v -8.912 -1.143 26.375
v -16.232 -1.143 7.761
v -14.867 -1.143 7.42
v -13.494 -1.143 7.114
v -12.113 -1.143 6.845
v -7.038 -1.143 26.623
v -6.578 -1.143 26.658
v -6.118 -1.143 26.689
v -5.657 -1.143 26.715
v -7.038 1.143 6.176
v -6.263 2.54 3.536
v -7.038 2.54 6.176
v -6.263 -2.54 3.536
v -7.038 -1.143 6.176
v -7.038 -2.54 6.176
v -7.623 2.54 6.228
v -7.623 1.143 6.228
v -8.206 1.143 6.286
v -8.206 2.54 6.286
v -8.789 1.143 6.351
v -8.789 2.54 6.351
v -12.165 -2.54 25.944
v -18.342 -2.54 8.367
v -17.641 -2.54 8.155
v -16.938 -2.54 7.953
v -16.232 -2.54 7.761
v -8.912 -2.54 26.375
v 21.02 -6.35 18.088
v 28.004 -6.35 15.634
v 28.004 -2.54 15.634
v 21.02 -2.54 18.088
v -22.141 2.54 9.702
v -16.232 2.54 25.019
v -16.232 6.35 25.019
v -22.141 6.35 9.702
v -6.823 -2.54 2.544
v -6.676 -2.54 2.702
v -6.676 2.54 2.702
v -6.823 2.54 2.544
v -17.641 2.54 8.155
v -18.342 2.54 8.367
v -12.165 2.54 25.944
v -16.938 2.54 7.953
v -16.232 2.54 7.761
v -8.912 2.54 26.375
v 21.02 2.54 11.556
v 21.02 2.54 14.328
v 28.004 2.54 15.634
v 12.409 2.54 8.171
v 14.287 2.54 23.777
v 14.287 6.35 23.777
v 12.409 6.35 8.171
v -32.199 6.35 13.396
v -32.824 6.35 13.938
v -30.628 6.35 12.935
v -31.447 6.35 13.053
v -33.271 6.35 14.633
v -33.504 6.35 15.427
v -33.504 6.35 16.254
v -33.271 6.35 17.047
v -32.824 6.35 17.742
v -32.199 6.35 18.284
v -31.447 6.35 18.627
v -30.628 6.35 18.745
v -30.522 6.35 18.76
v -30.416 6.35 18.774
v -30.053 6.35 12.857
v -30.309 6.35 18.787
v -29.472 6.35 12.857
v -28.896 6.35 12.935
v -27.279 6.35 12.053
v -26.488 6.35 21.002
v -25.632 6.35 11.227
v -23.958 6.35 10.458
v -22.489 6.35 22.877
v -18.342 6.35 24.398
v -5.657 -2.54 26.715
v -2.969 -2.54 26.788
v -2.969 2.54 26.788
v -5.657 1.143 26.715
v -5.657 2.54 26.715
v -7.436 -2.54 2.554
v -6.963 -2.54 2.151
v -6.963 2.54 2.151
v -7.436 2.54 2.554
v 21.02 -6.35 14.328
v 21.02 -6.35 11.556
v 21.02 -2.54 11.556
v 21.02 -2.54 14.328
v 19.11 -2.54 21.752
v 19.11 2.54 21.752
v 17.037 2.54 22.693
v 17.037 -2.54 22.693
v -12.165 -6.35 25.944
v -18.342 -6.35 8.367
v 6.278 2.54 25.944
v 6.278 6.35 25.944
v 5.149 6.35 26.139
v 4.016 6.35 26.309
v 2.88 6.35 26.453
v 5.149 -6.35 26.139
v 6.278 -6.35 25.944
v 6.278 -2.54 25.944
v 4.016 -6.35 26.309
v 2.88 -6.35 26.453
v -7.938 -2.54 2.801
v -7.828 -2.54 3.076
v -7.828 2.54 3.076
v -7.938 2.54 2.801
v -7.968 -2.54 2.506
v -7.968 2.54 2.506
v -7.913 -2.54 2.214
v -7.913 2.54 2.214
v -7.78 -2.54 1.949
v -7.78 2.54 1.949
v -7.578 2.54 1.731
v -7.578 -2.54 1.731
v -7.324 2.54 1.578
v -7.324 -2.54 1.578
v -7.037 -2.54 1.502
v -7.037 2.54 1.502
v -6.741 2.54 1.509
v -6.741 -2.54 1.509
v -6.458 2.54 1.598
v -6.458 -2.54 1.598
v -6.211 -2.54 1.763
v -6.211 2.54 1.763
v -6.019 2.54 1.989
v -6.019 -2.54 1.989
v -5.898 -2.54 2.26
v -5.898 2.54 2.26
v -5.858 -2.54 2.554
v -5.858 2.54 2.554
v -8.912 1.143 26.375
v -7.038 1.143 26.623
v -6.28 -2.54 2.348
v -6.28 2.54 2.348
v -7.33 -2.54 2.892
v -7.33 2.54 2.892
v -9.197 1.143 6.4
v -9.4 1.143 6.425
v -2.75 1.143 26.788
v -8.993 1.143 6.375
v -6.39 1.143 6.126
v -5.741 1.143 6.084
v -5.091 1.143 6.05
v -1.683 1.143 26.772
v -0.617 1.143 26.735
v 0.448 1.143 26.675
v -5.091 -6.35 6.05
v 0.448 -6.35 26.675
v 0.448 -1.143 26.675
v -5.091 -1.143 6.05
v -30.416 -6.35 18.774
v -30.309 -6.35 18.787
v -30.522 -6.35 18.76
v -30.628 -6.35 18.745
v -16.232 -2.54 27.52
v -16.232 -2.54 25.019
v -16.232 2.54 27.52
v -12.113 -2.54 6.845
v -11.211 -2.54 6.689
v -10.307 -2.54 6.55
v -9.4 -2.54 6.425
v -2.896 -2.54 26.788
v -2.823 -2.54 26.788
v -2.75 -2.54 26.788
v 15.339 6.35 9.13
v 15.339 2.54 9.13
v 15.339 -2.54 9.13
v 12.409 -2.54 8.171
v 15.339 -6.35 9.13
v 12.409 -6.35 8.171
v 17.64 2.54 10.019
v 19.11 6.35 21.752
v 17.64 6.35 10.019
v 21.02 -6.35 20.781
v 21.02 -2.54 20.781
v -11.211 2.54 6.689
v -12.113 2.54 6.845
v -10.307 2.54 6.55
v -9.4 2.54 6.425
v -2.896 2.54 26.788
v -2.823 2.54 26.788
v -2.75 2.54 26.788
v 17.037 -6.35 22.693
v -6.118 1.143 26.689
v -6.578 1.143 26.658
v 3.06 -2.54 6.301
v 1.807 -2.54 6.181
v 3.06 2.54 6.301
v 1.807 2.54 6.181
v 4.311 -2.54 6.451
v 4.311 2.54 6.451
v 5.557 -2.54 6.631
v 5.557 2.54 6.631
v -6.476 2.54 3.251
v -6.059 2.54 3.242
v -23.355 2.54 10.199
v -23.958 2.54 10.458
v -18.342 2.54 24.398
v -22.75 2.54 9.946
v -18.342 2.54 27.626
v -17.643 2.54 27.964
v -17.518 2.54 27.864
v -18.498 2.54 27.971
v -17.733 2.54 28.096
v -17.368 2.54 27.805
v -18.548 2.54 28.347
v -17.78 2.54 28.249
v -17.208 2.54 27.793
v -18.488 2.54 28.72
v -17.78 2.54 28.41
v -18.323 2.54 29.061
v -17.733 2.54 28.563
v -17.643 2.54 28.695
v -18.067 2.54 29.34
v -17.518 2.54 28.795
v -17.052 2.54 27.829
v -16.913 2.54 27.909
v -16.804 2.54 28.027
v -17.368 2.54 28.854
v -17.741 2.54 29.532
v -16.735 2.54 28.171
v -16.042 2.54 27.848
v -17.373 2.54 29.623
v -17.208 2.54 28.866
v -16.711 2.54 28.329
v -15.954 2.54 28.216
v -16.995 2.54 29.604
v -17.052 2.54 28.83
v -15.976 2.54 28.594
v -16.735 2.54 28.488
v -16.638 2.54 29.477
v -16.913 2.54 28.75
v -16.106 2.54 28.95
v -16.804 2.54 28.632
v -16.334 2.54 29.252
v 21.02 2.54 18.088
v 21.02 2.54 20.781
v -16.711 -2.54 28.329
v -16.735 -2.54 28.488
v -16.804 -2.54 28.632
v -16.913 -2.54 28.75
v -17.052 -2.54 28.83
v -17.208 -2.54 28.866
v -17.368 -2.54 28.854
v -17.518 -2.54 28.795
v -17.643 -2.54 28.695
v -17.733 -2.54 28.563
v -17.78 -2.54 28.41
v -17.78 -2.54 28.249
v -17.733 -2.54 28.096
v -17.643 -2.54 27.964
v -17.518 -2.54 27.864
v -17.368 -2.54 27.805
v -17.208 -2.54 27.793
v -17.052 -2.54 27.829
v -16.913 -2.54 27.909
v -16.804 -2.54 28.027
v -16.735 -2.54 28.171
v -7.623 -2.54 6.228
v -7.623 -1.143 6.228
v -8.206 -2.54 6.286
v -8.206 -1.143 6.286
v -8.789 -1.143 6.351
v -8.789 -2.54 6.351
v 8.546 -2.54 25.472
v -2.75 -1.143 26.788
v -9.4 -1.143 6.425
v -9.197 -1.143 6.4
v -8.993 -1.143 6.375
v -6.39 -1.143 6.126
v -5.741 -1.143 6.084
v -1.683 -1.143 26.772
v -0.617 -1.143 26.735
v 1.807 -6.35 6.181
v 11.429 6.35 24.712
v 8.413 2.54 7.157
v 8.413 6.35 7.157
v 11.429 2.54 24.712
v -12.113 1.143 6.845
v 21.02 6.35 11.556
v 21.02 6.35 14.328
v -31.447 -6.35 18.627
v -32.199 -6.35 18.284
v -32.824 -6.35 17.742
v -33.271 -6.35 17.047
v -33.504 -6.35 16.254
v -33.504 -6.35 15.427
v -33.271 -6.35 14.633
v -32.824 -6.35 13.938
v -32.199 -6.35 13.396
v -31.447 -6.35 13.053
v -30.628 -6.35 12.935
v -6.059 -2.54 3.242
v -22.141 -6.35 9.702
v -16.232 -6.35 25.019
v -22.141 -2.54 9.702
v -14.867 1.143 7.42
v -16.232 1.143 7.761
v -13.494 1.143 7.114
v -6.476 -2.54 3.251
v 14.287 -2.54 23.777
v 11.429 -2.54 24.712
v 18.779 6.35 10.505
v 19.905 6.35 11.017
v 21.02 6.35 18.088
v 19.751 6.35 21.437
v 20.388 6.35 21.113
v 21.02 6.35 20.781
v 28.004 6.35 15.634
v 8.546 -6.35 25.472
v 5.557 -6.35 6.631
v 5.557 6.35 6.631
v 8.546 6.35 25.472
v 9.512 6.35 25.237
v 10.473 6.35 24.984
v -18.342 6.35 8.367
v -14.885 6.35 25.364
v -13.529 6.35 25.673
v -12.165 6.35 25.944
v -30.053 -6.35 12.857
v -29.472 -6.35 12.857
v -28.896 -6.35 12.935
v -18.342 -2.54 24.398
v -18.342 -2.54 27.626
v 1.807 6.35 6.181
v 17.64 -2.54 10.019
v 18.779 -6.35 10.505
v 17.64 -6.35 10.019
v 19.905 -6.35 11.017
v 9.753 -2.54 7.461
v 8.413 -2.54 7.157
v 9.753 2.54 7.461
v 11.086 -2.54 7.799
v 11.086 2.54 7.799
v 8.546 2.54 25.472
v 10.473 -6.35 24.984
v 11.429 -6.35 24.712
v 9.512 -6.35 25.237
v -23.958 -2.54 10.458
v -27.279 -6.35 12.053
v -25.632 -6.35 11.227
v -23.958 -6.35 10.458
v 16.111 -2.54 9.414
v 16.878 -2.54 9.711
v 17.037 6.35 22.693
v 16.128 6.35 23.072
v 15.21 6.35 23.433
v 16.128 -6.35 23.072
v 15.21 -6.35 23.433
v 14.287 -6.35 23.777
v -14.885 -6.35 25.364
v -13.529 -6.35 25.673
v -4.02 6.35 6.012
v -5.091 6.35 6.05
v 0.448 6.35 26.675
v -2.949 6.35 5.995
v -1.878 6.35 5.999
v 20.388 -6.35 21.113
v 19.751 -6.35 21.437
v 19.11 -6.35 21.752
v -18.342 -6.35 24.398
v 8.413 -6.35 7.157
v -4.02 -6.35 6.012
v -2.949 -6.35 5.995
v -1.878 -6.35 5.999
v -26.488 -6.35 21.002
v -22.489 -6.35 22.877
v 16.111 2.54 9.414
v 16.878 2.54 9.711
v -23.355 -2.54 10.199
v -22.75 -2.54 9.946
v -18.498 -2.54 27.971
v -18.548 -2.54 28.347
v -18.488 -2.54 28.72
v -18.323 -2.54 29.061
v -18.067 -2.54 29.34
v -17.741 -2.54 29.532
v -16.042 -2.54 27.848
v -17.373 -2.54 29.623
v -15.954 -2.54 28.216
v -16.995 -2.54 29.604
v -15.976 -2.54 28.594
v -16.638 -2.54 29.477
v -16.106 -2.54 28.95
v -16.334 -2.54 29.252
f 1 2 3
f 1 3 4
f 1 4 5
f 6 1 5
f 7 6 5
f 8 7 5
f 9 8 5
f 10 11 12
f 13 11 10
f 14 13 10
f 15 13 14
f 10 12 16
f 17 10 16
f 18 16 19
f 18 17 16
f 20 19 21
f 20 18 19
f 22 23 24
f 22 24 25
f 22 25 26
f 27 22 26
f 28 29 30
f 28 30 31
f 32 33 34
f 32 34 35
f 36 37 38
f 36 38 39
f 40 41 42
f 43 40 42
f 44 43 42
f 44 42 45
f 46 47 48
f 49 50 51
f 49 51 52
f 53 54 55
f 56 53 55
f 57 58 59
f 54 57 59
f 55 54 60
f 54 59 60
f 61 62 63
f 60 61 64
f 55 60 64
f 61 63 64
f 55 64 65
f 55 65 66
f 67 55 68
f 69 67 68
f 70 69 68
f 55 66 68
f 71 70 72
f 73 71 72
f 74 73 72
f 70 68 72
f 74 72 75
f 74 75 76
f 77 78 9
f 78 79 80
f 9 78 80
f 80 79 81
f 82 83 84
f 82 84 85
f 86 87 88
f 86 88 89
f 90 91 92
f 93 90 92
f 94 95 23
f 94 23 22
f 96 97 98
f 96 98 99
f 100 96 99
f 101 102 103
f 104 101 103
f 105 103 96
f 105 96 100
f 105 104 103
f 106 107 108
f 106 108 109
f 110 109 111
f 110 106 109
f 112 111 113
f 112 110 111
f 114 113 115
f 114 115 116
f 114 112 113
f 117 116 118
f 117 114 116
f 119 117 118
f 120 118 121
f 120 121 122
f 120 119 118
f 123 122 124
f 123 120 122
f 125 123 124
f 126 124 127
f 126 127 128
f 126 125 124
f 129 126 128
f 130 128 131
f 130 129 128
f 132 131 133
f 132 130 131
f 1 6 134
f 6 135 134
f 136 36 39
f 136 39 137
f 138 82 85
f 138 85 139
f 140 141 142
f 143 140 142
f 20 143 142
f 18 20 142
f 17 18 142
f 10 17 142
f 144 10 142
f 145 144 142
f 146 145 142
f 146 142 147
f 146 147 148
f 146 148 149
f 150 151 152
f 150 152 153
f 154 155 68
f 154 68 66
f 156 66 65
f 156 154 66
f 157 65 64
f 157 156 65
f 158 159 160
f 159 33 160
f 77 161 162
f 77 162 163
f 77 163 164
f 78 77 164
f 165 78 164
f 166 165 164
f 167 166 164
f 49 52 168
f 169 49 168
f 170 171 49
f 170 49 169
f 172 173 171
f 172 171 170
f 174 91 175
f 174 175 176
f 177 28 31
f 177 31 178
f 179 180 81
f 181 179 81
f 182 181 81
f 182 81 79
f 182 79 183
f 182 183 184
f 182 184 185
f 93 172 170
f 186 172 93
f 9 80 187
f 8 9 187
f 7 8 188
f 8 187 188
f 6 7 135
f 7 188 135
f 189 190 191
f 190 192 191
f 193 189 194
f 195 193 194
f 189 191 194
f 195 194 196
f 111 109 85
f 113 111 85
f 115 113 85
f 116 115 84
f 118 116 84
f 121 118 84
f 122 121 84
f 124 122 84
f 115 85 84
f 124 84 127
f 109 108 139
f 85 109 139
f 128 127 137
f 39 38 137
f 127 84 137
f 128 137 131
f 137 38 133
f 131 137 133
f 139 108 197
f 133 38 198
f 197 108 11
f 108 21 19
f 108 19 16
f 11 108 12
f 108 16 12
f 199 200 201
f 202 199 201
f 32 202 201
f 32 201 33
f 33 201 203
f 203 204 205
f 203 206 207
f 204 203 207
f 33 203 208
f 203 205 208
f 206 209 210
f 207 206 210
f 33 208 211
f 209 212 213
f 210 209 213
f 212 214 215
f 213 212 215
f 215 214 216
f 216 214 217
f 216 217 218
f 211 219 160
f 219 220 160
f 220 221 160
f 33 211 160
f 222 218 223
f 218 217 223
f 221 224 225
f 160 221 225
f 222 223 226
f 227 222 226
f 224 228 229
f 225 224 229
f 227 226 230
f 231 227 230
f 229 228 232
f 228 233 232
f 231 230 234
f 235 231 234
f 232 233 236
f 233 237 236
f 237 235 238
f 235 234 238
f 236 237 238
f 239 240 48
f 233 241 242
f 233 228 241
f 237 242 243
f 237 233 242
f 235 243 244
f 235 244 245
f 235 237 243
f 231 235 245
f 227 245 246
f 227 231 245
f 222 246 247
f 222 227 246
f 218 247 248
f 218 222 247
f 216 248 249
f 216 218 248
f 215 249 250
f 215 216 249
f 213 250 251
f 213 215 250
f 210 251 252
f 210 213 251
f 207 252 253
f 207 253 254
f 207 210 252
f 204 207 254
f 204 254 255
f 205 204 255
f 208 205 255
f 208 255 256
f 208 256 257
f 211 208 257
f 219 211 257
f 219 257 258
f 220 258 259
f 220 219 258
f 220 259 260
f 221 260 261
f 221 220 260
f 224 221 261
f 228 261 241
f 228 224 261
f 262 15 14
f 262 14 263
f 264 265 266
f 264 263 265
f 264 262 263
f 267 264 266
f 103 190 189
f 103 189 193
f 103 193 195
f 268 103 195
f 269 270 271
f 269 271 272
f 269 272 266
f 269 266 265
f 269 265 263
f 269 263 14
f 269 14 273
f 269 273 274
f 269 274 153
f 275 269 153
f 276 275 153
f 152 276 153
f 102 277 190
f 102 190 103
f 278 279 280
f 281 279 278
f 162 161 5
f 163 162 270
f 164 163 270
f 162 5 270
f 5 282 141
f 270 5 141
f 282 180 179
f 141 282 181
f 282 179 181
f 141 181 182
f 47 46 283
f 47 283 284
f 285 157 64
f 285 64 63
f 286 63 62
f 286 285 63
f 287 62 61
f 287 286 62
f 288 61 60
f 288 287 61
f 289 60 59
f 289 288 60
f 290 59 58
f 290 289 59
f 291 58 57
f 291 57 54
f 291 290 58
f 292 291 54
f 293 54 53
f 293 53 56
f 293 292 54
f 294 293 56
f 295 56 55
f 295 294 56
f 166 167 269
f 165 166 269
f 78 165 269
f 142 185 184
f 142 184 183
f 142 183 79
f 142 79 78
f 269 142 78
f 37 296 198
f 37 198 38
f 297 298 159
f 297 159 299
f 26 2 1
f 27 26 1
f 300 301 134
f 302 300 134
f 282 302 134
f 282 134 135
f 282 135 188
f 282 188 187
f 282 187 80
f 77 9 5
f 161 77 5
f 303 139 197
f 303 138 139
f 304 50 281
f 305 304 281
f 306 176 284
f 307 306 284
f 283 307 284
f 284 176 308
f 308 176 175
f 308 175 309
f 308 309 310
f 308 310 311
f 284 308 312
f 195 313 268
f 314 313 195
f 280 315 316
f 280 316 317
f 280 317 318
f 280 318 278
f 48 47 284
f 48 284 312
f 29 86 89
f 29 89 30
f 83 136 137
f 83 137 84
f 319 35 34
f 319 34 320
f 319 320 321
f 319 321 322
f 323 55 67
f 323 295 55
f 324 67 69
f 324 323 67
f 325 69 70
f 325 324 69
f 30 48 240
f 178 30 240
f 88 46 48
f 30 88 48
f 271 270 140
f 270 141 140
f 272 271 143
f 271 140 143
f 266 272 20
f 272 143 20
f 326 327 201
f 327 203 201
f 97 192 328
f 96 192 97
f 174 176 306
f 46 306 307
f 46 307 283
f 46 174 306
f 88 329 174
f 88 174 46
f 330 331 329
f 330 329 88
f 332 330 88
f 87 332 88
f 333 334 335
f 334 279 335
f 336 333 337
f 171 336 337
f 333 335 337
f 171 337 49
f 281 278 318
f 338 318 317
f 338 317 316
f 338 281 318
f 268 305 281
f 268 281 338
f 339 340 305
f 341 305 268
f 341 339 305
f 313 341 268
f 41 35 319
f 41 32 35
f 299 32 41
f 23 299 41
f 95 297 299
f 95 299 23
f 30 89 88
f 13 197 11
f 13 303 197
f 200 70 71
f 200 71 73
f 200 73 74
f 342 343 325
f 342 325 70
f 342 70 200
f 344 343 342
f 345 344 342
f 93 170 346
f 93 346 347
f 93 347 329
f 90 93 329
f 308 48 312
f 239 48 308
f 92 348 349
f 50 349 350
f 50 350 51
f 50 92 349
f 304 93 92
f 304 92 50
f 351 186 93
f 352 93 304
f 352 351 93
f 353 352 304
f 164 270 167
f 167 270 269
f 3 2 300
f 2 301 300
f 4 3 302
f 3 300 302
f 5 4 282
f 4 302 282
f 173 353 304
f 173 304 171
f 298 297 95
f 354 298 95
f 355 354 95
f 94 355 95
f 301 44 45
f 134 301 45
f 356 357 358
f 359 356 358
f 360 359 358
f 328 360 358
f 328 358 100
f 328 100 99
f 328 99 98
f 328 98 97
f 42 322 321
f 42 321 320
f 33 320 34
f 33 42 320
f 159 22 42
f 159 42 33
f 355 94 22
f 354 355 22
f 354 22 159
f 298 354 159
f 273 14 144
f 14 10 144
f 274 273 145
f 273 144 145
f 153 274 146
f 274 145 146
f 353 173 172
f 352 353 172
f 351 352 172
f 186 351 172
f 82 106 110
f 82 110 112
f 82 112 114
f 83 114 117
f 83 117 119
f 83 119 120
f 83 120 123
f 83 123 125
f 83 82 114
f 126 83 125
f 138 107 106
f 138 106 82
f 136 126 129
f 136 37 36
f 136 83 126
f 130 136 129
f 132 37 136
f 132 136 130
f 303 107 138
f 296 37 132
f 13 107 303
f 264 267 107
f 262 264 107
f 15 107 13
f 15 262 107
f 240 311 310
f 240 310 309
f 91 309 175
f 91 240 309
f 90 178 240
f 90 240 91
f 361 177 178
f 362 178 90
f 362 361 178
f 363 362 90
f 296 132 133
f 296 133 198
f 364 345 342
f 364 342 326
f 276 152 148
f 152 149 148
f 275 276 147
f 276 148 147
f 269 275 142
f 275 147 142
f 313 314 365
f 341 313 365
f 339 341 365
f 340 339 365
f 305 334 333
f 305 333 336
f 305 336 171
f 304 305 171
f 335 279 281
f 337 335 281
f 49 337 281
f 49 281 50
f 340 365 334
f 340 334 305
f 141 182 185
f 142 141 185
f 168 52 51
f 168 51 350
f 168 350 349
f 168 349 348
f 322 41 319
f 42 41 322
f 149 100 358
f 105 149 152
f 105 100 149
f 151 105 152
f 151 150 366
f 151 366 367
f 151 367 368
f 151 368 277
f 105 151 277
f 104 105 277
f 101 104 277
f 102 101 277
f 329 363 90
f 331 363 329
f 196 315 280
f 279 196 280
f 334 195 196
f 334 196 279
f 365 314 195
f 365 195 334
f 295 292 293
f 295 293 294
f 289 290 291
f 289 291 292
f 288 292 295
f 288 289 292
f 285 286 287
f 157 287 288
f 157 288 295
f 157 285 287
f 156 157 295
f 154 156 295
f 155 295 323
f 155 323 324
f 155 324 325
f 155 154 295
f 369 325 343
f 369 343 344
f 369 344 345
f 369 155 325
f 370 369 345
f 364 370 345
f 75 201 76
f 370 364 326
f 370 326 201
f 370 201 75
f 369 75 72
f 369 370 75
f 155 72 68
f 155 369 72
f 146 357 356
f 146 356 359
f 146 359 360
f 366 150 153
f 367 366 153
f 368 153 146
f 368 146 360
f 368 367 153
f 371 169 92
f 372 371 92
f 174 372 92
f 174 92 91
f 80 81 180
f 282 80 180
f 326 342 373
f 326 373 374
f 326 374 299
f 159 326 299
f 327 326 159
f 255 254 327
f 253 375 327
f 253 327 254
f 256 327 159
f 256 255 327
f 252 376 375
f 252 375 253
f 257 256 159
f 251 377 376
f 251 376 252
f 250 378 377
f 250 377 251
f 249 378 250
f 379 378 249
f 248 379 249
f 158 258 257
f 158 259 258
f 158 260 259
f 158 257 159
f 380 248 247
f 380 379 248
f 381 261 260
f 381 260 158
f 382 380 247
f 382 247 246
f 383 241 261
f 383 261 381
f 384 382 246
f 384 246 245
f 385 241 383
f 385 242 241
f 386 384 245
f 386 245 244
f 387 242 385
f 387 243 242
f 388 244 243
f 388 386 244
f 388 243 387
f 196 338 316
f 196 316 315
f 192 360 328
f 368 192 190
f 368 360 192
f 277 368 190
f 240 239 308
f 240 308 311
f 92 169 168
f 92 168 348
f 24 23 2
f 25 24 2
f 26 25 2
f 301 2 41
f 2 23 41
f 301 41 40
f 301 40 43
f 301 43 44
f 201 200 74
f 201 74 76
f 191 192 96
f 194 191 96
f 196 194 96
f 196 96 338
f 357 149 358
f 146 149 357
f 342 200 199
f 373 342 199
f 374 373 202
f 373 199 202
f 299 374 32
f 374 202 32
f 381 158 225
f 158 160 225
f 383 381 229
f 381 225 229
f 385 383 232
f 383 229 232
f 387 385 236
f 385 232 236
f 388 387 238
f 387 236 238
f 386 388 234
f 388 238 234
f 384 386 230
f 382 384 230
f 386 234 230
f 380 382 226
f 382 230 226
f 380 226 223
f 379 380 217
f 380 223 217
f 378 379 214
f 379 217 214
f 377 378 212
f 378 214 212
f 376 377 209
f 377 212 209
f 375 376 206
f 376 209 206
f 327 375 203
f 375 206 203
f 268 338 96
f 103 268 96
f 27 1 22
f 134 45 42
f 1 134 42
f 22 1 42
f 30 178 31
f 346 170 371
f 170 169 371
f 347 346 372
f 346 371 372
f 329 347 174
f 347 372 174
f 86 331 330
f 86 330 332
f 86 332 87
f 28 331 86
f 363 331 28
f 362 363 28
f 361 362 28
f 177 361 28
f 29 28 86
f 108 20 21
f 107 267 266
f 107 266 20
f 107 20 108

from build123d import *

# Parameters (mm, degrees)
F1_DEPTH = 6.35
F2_DEPTH = 1.143
F0_R     = 0.5376774343
F3_DEPTH = 2.54


# Not quite as in the source:
# - a feature names something its author has since deleted; it is built from what else it names


with BuildPart() as f1:
    # F0 (on Front) → F1 (new body, symmetric)
    with BuildSketch(Plane.XZ):
        with BuildLine():
            Line((-23.957899441, 10.4580381471), (-18.3417778462, 24.3978608632))
            ThreePointArc((-18.3417778462, 24.3978608632), (-24.508682548, 21.9832418882), (-30.3090570475, 18.7868761299))
            ThreePointArc((-30.3090570475, 18.7868761299), (-30.4688345425, 18.7669734191), (-30.6283324456, 18.7449419699))
            ThreePointArc((-30.6283324456, 18.7449419699), (-33.5331514259, 15.8401229896), (-30.6283324456, 12.9353040093))
            ThreePointArc((-30.6283324456, 12.9353040093), (-29.7623700905, 12.8471763438), (-28.8964077355, 12.9353040093))
            ThreePointArc((-28.8964077355, 12.9353040093), (-26.4593844973, 11.6324177359), (-23.957899441, 10.4580381471))
        make_face()
    extrude(amount=F1_DEPTH, both=True)



with BuildPart() as f1b:
    # F0 (on Front) → F1, piece 2 (new body, symmetric)
    with BuildSketch(Plane.XZ):
        with BuildLine():
            Line((-18.3417778462, 8.3667041198), (-12.1646409942, 25.9439263056))
            ThreePointArc((-12.1646409942, 25.9439263056), (-14.2076271577, 25.5232665303), (-16.2316225469, 25.0190941641))
            Line((-16.2316225469, 25.0190941641), (-22.1410569955, 9.7018790977))
            Line((-22.1410569955, 9.7018790977), (-18.3417778462, 8.3667041198))
        make_face()
    extrude(amount=F1_DEPTH, both=True)


with BuildPart() as f1c:
    # F0 (on Front) → F1, piece 3 (new body, symmetric)
    with BuildSketch(Plane.XZ):
        with BuildLine():
            Line((1.8068482134, 6.1805279437), (6.278092768, 25.9439263056))
            ThreePointArc((6.278092768, 25.9439263056), (4.5833562732, 26.2272072808), (2.8800089407, 26.4530119809))
            Line((2.8800089407, 26.4530119809), (-1.8782013648, 5.999318733))
            Line((-1.8782013648, 5.999318733), (1.8068482134, 6.1805279437))
        make_face()
        with BuildLine():
            Line((-1.8782013648, 5.999318733), (2.8800089407, 26.4530119809))
            Line((2.8800089407, 26.4530119809), (0.4476490102, 26.6745825214))
            Line((0.4476490102, 26.6745825214), (-5.0909425313, 6.0502526163))
            ThreePointArc((-5.0909425313, 6.0502526163), (-3.4849571687, 6.0004872294), (-1.8782013648, 5.999318733))
        make_face()
    extrude(amount=F1_DEPTH, both=True)


with BuildPart() as f1d:
    # F0 (on Front) → F1, piece 4 (new body, symmetric)
    with BuildSketch(Plane.XZ):
        with BuildLine():
            Line((8.4127366642, 7.1570997269), (11.4288211982, 24.7124430234))
            ThreePointArc((11.4288211982, 24.7124430234), (9.992896211, 25.1131857412), (8.5458304529, 25.4716212117))
            Line((8.5458304529, 25.4716212117), (5.5570962218, 6.6305751818))
            Line((5.5570962218, 6.6305751818), (8.4127366642, 7.1570997269))
        make_face()
    extrude(amount=F1_DEPTH, both=True)


with BuildPart() as f1e:
    # F0 (on Front) → F1, piece 5 (new body, symmetric)
    with BuildSketch(Plane.XZ):
        with BuildLine():
            Line((15.3388230563, 9.1300772804), (17.0374851182, 22.6934409017))
            ThreePointArc((17.0374851182, 22.6934409017), (15.6698818595, 23.2551052755), (14.2865132328, 23.7767342476))
            Line((14.2865132328, 23.7767342476), (12.4090739429, 8.1711044117))
            Line((12.4090739429, 8.1711044117), (15.3388230563, 9.1300772804))
        make_face()
    extrude(amount=F1_DEPTH, both=True)


with BuildPart() as f1f:
    # F0 (on Front) → F1, piece 6 (new body, symmetric)
    with BuildSketch(Plane.XZ):
        with BuildLine():
            Line((21.0198694331, 18.0883333087), (21.0198694322, 20.7808247964))
            ThreePointArc((21.0198694322, 20.7808247964), (20.069859076, 21.2762433466), (19.1096116707, 21.7515160445))
            Line((19.1096116707, 21.7515160445), (17.6402366731, 10.0189484933))
            ThreePointArc((17.6402366731, 10.0189484933), (19.3434832269, 10.757776133), (21.0198694351, 11.5556761172))
            Line((21.0198694351, 11.5556761172), (21.0198694343, 14.3284648657))
            Line((21.0198694343, 14.3284648657), (21.0198694331, 18.0883333087))
        make_face()
        Polygon((21.0198694343, 14.3284648657), (28.0039037731, 15.6337103452), (21.0198694331, 18.0883333087), align=None)
    extrude(amount=F1_DEPTH, both=True)


with BuildPart() as f1_1:
    add(f1.part)

    add(f1b.part)  # F2 merges F1b

    add(f1c.part)  # F2 merges F1c

    add(f1d.part)  # F2 merges F1d

    add(f1e.part)  # F2 merges F1e

    add(f1f.part)  # F2 merges F1f
    # F0 (on Front) → F2 (join, symmetric)
    with BuildSketch(Plane.XZ):
        with BuildLine():
            Line((-12.1127719974, 6.8447730539), (-5.6567463208, 26.7153601349))
            ThreePointArc((-5.6567463208, 26.7153601349), (-6.3478066879, 26.6736702184), (-7.0382347309, 26.6225664263))
            Line((-7.0382347309, 26.6225664263), (-8.9119801903, 26.3745176413))
            Line((-8.9119801903, 26.3745176413), (-16.2316225469, 7.7613705689))
            ThreePointArc((-16.2316225469, 7.7613705689), (-14.1813025903, 7.2621558762), (-12.1127719974, 6.8447730539))
        make_face()
        with BuildLine():
            Line((-5.0909425313, 6.0502526163), (0.4476490102, 26.6745825214))
            ThreePointArc((0.4476490102, 26.6745825214), (-1.1501754418, 26.7562261377), (-2.7497784488, 26.787513187))
            Line((-2.7497784488, 26.787513187), (-9.4000246121, 6.4253498282))
            ThreePointArc((-9.4000246121, 6.4253498282), (-9.0947770245, 6.3870993561), (-8.7893130258, 6.3506173901))
            ThreePointArc((-8.7893130258, 6.3506173901), (-7.91449717, 6.2560428931), (-7.0382347309, 6.1759725811))
            ThreePointArc((-7.0382347309, 6.1759725811), (-6.0651659933, 6.1041697642), (-5.0909425313, 6.0502526163))
        make_face()
        with BuildLine():
            Line((-9.4000246121, 6.4253498282), (-2.7497784488, 26.787513187))
            ThreePointArc((-2.7497784488, 26.787513187), (-2.8593531847, 26.7878123797), (-2.968928311, 26.7878752202))
            Line((-2.968928311, 26.7878752202), (-5.6567463208, 26.7153601349))
            Line((-5.6567463208, 26.7153601349), (-12.1127719974, 6.8447730539))
            ThreePointArc((-12.1127719974, 6.8447730539), (-10.7591081046, 6.6175349855), (-9.4000246121, 6.4253498282))
        make_face()
        with BuildLine():
            ThreePointArc((-18.3417778462, 8.3667041198), (-17.2898277228, 8.0531349816), (-16.2316225469, 7.7613705689))
            Line((-16.2316225469, 7.7613705689), (-8.9119801903, 26.3745176413))
            Line((-8.9119801903, 26.3745176413), (-12.1646409942, 25.9439263056))
            Line((-12.1646409942, 25.9439263056), (-18.3417778462, 8.3667041198))
        make_face()
        with BuildLine():
            Line((5.5570962218, 6.6305751818), (8.5458304529, 25.4716212117))
            Line((8.5458304529, 25.4716212117), (6.278092768, 25.9439263056))
            Line((6.278092768, 25.9439263056), (1.8068482134, 6.1805279437))
            ThreePointArc((1.8068482134, 6.1805279437), (3.6859738146, 6.3722062161), (5.5570962218, 6.6305751818))
        make_face()
        with BuildLine():
            Line((12.4090739429, 8.1711044117), (14.2865132328, 23.7767342476))
            Line((14.2865132328, 23.7767342476), (11.4288211982, 24.7124430234))
            Line((11.4288211982, 24.7124430234), (8.4127366642, 7.1570997269))
            ThreePointArc((8.4127366642, 7.1570997269), (10.4207473928, 7.62531299), (12.4090739429, 8.1711044117))
        make_face()
        with BuildLine():
            Line((17.6402366731, 10.0189484933), (19.1096116707, 21.7515160445))
            Line((19.1096116707, 21.7515160445), (17.0374851182, 22.6934409017))
            Line((17.0374851182, 22.6934409017), (15.3388230563, 9.1300772804))
            ThreePointArc((15.3388230563, 9.1300772804), (16.4946911486, 9.5611495909), (17.6402366731, 10.0189484933))
        make_face()
        with BuildLine():
            Line((-22.1410569955, 9.7018790977), (-16.2316225469, 25.0190941641))
            ThreePointArc((-16.2316225469, 25.0190941641), (-17.2900631098, 24.7199003867), (-18.3417778462, 24.3978608632))
            Line((-18.3417778462, 24.3978608632), (-23.957899441, 10.4580381471))
            ThreePointArc((-23.957899441, 10.4580381471), (-23.0529803303, 10.0715440095), (-22.1410569955, 9.7018790977))
        make_face()
    extrude(amount=F2_DEPTH, both=True)

    # F0 (on Front) → F3 (join, symmetric)
    with BuildSketch(Plane.XZ):
        with BuildLine():
            Line((-22.1410569955, 9.7018790977), (-16.2316225469, 25.0190941641))
            ThreePointArc((-16.2316225469, 25.0190941641), (-17.2900631098, 24.7199003867), (-18.3417778462, 24.3978608632))
            Line((-18.3417778462, 24.3978608632), (-23.957899441, 10.4580381471))
            ThreePointArc((-23.957899441, 10.4580381471), (-23.0529803303, 10.0715440095), (-22.1410569955, 9.7018790977))
        make_face()
        with BuildLine():
            ThreePointArc((-18.3417778462, 8.3667041198), (-17.2898277228, 8.0531349816), (-16.2316225469, 7.7613705689))
            Line((-16.2316225469, 7.7613705689), (-8.9119801903, 26.3745176413))
            Line((-8.9119801903, 26.3745176413), (-12.1646409942, 25.9439263056))
            Line((-12.1646409942, 25.9439263056), (-18.3417778462, 8.3667041198))
        make_face()
        with BuildLine():
            Line((-9.4000246121, 6.4253498282), (-2.7497784488, 26.787513187))
            ThreePointArc((-2.7497784488, 26.787513187), (-2.8593531847, 26.7878123797), (-2.968928311, 26.7878752202))
            Line((-2.968928311, 26.7878752202), (-5.6567463208, 26.7153601349))
            Line((-5.6567463208, 26.7153601349), (-12.1127719974, 6.8447730539))
            ThreePointArc((-12.1127719974, 6.8447730539), (-10.7591081046, 6.6175349855), (-9.4000246121, 6.4253498282))
        make_face()
        with BuildLine():
            Line((5.5570962218, 6.6305751818), (8.5458304529, 25.4716212117))
            Line((8.5458304529, 25.4716212117), (6.278092768, 25.9439263056))
            Line((6.278092768, 25.9439263056), (1.8068482134, 6.1805279437))
            ThreePointArc((1.8068482134, 6.1805279437), (3.6859738146, 6.3722062161), (5.5570962218, 6.6305751818))
        make_face()
        with BuildLine():
            Line((12.4090739429, 8.1711044117), (14.2865132328, 23.7767342476))
            Line((14.2865132328, 23.7767342476), (11.4288211982, 24.7124430234))
            Line((11.4288211982, 24.7124430234), (8.4127366642, 7.1570997269))
            ThreePointArc((8.4127366642, 7.1570997269), (10.4207473928, 7.62531299), (12.4090739429, 8.1711044117))
        make_face()
        with BuildLine():
            Line((17.6402366731, 10.0189484933), (19.1096116707, 21.7515160445))
            Line((19.1096116707, 21.7515160445), (17.0374851182, 22.6934409017))
            Line((17.0374851182, 22.6934409017), (15.3388230563, 9.1300772804))
            ThreePointArc((15.3388230563, 9.1300772804), (16.4946911486, 9.5611495909), (17.6402366731, 10.0189484933))
        make_face()
        Polygon((28.0039037731, 15.6337103452), (21.0198694322, 20.7808247964), (21.0198694331, 18.0883333087), align=None)
        Polygon((21.0198694351, 11.5556761172), (28.0039037731, 15.6337103452), (21.0198694343, 14.3284648657), align=None)
        with BuildLine():
            ThreePointArc((-18.3417778462, 24.3978608632), (-17.2900631098, 24.7199003867), (-16.2316225469, 25.0190941641))
            Line((-16.2316225469, 25.0190941641), (-16.2316225469, 27.5203254709))
            Line((-16.2316225469, 27.5203254709), (-18.3417778462, 27.6264417917))
            Line((-18.3417778462, 27.6264417917), (-18.3417778462, 24.3978608632))
        make_face()
        with BuildLine():
            Line((-18.3417778462, 27.6264417917), (-16.2316225469, 27.5203254709))
            ThreePointArc((-16.2316225469, 27.5203254709), (-17.1834027814, 29.6274841361), (-18.3417778462, 27.6264417917))
        make_face()
        with Locations((-17.248678008, 28.3294664105)):
            Circle(F0_R, mode=Mode.SUBTRACT)
        with BuildLine():
            Line((-6.263176576, 3.5358044787), (-7.0382347309, 6.1759725811))
            ThreePointArc((-7.0382347309, 6.1759725811), (-7.91449717, 6.2560428931), (-8.7893130258, 6.3506173901))
            Line((-8.7893130258, 6.3506173901), (-7.8281190425, 3.0763937997))
            Line((-7.8281190425, 3.0763937997), (-6.263176576, 3.5358044787))
        make_face()
        with BuildLine():
            Line((-6.4755459316, 3.2506433781), (-6.263176576, 3.5358044787))
            Line((-6.263176576, 3.5358044787), (-7.8281190425, 3.0763937997))
            ThreePointArc((-7.8281190425, 3.0763937997), (-7.1834055221, 1.5302282542), (-5.857669426, 2.5542923249))
            Line((-5.857669426, 2.5542923249), (-6.0594304827, 3.2415737925))
            Line((-6.0594304827, 3.2415737925), (-6.6755125299, 2.7018676046))
            Line((-6.6755125299, 2.7018676046), (-6.8233669735, 2.54364172))
            Line((-6.8233669735, 2.54364172), (-6.2799803729, 2.3477658746))
            Line((-6.2799803729, 2.3477658746), (-6.9631087507, 2.1509963489))
            Line((-6.9631087507, 2.1509963489), (-7.4357455596, 2.5542923249))
            Line((-7.4357455596, 2.5542923249), (-7.3302290402, 2.8919170145))
            Line((-7.3302290402, 2.8919170145), (-6.4755459316, 3.2506433781))
        make_face()
    extrude(amount=F3_DEPTH, both=True)


solid = f1_1.part
